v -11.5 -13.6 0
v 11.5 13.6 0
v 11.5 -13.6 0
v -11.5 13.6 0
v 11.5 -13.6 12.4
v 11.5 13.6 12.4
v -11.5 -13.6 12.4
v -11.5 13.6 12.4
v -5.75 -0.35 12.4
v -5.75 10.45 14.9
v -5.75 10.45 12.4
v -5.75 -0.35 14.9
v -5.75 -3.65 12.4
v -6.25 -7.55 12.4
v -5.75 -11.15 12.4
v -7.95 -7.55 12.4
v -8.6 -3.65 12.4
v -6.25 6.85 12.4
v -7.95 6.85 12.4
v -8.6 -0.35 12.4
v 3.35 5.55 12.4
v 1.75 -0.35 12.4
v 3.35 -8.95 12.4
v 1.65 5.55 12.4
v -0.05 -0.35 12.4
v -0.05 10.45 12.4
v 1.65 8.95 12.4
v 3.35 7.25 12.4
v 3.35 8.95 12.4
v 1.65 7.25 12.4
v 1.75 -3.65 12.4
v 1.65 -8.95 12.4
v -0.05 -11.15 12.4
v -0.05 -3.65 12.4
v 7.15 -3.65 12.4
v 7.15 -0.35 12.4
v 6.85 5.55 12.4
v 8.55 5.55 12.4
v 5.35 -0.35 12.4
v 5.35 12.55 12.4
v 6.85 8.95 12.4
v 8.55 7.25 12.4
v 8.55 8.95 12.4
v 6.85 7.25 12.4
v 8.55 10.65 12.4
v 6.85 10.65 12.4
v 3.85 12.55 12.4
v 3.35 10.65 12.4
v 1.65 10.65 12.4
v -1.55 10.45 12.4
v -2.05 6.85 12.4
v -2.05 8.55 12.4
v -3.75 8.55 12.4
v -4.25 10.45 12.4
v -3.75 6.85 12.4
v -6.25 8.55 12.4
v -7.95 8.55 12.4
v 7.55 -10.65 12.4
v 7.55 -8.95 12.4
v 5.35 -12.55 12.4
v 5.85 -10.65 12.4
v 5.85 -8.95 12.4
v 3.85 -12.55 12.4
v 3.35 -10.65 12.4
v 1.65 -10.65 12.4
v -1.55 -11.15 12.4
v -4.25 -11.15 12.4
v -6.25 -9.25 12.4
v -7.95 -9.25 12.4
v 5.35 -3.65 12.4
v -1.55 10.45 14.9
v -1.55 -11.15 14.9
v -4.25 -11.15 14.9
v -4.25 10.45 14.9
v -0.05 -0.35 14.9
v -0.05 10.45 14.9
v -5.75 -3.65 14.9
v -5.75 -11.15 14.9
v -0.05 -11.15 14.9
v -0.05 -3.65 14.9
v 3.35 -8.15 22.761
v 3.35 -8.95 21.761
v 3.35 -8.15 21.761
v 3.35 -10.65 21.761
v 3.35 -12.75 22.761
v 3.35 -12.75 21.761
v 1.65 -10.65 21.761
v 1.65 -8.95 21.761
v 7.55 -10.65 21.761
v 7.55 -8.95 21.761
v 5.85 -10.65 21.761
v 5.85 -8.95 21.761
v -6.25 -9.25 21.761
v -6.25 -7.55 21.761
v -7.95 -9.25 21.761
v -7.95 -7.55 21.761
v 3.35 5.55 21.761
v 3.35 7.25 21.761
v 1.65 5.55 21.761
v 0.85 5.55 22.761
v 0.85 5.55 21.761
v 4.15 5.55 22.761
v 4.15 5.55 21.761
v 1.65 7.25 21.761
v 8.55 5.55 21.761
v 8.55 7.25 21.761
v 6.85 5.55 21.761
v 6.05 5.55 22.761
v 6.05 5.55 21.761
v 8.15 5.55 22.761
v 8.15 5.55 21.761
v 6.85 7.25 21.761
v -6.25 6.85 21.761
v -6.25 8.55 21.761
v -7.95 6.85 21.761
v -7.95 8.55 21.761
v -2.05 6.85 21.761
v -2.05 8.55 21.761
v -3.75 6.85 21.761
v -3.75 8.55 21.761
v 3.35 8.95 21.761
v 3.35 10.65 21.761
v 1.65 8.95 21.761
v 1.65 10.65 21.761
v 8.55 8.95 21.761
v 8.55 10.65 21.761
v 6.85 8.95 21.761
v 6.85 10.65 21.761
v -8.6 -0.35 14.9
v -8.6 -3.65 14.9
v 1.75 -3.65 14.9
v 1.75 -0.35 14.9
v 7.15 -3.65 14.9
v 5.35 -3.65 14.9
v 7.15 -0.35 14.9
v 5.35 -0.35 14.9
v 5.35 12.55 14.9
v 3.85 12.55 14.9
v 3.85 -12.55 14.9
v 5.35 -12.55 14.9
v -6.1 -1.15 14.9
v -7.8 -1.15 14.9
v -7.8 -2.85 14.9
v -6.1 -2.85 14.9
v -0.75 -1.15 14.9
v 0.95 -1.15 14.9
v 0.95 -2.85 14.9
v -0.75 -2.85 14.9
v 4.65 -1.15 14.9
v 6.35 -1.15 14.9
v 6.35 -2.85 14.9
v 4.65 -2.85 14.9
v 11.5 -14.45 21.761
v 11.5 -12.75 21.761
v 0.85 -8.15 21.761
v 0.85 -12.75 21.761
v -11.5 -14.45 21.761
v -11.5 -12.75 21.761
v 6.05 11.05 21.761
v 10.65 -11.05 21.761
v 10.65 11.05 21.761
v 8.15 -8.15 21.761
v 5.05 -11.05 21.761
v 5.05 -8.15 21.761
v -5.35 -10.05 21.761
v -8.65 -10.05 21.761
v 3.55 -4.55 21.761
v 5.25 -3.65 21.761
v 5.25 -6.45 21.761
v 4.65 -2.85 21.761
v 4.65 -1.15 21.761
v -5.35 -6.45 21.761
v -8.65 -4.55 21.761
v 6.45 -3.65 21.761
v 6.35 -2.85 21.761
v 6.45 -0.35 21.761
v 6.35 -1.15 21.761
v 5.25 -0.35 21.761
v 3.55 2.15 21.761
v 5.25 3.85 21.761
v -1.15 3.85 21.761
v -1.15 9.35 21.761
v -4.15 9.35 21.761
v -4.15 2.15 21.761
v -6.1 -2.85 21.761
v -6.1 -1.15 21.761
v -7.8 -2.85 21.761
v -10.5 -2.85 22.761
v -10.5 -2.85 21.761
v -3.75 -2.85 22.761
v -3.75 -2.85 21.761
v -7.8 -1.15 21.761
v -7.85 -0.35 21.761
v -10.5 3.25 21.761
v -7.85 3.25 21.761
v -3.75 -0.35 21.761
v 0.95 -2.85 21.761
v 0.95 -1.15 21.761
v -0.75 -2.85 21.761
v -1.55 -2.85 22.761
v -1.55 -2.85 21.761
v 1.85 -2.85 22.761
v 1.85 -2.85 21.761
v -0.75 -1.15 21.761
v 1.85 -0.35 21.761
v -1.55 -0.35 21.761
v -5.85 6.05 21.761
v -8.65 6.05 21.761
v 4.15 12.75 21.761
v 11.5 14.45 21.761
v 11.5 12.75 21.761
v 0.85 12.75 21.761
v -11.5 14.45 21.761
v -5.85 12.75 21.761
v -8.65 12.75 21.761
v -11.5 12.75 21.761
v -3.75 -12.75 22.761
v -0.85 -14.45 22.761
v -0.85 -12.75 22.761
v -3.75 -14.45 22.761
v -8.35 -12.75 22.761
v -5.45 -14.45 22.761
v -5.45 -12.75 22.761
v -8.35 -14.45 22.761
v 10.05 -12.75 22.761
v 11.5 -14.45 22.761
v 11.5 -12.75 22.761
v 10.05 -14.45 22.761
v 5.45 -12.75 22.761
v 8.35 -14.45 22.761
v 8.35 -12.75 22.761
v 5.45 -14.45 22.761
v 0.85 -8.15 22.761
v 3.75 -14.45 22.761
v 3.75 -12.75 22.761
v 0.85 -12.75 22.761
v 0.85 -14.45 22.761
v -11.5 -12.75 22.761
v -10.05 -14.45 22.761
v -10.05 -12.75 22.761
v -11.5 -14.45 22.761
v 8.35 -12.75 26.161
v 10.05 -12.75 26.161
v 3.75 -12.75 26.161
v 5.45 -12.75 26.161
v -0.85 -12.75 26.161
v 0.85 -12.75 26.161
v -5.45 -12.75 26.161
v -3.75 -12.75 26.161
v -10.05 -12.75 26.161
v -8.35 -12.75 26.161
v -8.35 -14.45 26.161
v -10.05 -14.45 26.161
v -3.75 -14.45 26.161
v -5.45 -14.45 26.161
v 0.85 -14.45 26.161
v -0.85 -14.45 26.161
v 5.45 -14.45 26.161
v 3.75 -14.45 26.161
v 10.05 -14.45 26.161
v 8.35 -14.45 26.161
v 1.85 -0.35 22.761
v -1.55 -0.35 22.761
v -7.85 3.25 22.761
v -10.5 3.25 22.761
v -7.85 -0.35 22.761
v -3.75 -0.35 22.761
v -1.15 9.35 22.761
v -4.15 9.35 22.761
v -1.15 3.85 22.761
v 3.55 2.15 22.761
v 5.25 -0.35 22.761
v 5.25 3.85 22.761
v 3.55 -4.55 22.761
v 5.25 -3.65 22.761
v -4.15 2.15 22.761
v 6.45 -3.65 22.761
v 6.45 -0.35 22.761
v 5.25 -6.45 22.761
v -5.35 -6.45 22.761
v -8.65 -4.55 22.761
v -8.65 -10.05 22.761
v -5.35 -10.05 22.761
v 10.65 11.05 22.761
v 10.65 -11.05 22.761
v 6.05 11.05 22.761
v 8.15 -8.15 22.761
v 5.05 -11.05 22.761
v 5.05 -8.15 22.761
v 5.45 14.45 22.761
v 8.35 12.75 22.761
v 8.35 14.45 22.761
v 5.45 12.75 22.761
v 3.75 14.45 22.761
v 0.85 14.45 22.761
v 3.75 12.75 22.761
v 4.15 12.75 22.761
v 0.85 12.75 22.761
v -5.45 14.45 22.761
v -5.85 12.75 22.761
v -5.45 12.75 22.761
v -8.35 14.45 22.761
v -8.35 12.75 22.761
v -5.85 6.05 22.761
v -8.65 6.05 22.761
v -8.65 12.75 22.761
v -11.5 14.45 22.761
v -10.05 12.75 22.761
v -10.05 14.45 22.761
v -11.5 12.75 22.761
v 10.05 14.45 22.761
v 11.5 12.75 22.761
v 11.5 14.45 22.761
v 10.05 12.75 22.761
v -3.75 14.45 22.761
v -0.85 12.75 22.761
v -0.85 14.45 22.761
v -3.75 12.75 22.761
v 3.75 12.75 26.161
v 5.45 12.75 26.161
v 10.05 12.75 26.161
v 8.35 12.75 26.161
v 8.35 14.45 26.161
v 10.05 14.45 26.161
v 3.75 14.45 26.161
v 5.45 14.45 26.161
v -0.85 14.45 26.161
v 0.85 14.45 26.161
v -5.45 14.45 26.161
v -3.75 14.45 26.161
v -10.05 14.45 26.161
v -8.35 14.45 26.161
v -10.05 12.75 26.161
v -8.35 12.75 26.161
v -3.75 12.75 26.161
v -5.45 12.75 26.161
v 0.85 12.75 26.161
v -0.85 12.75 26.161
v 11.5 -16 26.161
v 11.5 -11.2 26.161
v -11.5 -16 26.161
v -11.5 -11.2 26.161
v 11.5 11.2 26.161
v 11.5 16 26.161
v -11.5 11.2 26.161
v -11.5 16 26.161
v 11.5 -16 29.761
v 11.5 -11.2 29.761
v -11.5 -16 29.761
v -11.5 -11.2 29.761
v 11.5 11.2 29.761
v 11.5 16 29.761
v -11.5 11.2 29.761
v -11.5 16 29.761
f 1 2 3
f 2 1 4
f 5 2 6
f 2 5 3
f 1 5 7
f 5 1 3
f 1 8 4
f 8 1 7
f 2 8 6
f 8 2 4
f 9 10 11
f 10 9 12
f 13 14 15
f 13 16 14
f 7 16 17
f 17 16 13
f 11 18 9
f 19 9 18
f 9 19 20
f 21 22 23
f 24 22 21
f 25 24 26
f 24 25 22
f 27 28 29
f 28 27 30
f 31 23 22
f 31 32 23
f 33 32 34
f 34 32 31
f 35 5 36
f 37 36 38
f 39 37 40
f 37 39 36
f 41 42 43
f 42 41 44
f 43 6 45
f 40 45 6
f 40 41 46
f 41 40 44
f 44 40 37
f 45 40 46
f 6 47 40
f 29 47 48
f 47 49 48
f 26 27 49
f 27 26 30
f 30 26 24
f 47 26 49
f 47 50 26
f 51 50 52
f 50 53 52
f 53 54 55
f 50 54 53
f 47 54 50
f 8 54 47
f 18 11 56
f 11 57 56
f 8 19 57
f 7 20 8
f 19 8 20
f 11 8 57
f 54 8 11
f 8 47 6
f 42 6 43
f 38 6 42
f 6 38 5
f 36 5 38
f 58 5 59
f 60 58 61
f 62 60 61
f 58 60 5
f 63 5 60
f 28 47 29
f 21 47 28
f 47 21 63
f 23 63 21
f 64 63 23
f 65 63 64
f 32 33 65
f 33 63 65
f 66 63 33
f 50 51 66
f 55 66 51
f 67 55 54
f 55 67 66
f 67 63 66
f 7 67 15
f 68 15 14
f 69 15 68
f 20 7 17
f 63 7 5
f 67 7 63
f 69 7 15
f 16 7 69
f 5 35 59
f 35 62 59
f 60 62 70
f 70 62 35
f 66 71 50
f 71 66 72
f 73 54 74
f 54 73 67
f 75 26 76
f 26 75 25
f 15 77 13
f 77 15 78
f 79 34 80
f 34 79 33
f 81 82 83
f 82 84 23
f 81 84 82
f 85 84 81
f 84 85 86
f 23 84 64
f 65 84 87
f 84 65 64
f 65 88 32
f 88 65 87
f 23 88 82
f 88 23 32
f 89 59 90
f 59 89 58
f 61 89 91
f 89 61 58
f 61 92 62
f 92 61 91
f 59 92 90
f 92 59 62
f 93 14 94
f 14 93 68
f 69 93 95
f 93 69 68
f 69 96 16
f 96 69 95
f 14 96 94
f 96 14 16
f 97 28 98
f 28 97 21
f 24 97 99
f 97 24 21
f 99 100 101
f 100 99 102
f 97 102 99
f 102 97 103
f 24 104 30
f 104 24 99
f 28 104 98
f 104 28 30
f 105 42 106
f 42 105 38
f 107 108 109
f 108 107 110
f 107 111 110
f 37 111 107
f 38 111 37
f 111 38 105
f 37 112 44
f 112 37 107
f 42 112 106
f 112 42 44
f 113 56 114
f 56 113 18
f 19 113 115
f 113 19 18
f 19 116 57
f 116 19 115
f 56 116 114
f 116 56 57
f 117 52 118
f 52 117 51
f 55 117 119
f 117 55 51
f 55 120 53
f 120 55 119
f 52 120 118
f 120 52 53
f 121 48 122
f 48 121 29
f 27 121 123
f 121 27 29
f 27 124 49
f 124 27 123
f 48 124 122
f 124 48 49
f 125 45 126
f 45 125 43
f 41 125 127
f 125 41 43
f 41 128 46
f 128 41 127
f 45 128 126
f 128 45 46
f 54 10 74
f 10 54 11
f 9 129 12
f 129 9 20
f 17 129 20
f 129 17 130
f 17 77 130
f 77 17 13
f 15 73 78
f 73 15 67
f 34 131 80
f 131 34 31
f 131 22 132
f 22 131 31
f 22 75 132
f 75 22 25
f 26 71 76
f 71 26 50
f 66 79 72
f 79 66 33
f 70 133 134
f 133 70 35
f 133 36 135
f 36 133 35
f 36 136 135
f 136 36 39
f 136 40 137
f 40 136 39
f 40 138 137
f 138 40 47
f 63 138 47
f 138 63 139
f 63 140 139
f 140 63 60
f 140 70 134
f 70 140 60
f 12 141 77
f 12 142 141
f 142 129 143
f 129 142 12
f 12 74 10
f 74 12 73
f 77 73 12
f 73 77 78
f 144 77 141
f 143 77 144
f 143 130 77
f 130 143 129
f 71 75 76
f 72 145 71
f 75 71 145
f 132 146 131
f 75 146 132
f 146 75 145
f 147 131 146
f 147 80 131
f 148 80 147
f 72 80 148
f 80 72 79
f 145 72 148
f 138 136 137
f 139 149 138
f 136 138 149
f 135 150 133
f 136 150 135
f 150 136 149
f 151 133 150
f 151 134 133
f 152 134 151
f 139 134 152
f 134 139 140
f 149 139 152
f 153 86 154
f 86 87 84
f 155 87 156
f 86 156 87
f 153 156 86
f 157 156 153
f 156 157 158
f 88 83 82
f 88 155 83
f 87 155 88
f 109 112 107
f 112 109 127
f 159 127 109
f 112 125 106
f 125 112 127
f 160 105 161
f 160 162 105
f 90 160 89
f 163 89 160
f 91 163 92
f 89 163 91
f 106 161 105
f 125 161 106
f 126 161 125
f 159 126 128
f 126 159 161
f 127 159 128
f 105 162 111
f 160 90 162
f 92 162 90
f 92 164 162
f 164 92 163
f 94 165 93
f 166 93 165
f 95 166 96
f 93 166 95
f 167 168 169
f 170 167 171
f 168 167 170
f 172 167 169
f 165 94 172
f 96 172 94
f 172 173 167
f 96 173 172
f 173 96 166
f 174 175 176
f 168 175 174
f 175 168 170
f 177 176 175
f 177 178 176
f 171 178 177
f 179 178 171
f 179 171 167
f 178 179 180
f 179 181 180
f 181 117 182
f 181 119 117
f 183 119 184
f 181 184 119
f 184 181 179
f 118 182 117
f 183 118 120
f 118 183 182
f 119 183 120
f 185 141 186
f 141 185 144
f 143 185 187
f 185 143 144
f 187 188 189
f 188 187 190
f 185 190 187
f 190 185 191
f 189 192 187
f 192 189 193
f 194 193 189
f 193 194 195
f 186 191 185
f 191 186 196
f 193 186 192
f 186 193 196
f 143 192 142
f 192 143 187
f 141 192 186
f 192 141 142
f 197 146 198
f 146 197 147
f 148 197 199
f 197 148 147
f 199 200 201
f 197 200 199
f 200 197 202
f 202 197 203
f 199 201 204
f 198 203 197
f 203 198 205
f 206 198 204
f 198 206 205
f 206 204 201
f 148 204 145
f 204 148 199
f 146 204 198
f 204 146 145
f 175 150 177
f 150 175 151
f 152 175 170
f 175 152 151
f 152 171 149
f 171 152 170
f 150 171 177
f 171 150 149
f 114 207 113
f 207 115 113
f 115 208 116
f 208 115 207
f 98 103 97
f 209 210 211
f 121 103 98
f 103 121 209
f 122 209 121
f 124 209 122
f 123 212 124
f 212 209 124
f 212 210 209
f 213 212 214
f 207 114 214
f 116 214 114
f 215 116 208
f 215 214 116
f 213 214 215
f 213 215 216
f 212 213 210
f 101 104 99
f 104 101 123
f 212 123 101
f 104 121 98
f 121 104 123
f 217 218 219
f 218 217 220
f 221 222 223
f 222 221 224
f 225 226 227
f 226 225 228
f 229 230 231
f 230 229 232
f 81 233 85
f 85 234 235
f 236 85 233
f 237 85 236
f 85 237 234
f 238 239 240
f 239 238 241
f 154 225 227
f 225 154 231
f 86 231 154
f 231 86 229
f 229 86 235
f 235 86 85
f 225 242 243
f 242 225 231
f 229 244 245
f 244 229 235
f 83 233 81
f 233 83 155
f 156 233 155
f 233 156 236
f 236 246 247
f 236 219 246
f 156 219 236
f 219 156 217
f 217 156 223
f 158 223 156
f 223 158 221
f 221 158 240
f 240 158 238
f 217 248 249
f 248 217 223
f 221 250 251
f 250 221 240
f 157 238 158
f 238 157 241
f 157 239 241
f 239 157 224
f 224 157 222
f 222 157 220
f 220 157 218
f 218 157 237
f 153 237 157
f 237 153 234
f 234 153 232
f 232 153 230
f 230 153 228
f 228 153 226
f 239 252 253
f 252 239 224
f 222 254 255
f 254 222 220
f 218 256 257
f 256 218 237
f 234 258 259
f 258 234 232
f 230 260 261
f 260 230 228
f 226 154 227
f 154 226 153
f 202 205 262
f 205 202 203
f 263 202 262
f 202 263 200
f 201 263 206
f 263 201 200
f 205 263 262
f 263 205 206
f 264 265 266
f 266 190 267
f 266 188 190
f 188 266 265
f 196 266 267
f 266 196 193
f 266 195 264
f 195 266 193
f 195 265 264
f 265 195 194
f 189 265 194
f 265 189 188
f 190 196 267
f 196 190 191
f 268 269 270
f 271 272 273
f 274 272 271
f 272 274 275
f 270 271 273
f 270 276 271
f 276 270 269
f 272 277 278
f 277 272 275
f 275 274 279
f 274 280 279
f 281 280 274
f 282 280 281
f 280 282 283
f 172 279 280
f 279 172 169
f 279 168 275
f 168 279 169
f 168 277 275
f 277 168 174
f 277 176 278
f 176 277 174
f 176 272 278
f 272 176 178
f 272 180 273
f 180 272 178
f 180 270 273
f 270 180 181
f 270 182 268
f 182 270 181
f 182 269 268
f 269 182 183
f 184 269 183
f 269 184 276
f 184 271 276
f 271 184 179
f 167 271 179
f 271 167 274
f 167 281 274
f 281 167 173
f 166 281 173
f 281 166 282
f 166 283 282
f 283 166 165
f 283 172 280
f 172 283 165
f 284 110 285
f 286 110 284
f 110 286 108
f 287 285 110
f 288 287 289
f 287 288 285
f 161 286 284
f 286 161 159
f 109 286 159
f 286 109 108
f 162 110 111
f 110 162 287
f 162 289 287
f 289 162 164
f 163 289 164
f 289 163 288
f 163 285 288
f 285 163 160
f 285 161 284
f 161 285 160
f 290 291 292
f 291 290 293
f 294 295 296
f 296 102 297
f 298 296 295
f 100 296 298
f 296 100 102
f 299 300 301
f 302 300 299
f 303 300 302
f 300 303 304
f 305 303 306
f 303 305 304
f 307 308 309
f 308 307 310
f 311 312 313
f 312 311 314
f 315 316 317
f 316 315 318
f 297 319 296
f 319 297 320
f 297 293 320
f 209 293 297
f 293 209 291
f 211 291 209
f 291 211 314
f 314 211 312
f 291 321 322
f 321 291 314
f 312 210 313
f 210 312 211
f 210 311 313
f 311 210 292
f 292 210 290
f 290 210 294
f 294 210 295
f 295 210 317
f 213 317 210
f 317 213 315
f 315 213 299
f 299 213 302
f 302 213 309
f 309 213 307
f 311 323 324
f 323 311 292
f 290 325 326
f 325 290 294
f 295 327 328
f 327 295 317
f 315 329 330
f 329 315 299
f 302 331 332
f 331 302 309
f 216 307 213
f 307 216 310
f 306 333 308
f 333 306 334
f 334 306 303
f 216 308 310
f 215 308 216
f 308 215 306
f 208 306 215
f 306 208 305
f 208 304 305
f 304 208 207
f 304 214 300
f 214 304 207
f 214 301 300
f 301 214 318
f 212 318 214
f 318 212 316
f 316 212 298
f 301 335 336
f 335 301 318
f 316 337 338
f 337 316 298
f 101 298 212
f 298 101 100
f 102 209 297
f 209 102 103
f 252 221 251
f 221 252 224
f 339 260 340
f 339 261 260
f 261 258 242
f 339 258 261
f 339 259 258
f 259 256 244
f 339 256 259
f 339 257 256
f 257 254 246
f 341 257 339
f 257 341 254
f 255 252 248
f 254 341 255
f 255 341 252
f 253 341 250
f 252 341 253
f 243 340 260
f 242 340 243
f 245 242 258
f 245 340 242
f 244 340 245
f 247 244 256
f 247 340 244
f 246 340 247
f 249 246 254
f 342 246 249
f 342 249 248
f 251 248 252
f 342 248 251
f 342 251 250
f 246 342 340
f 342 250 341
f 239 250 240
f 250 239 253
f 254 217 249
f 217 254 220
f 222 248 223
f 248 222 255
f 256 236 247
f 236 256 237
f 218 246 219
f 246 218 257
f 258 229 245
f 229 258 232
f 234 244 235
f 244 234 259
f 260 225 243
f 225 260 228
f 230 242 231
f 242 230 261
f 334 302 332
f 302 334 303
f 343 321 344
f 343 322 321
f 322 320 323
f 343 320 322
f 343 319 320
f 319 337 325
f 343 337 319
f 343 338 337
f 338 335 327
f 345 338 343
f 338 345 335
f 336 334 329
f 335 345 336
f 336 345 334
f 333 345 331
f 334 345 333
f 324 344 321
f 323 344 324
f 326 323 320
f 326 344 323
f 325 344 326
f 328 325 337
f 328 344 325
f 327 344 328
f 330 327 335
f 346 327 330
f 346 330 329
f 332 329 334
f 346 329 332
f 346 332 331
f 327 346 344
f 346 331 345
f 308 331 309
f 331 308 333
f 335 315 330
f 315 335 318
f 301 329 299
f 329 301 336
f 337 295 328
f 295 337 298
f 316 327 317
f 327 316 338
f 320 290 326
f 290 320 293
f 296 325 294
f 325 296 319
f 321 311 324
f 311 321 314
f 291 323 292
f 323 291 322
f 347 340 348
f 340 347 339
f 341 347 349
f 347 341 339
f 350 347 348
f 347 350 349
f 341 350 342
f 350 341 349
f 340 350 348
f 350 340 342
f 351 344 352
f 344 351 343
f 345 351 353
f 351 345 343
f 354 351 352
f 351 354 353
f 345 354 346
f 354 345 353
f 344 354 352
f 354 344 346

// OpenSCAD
// Generated by SolidPython 0.4.2 on 2020-09-29 23:21:07
//!OpenSCAD

scale(v = 0.0100000000) {
	translate(v = [-1150, -1360, 0]) {
		union() {
			color(c = [0.4000000000, 0.4000000000, 0.4000000000]) {
				translate(v = [0, 0, 0]) {
					linear_extrude(height = 1000.0000000000) {
						polygon(paths = [[0, 1, 2, 3]], points = [[0, 0], [0, 2720], [2300, 2720], [2300, 0]]);
					}
				}
			}
			color(c = [0.2000000000, 0.6000000000, 0.2000000000]) {
				translate(v = [0, 0, 1000.0000000000]) {
					linear_extrude(height = 120.0000000000) {
						polygon(paths = [[0, 1, 2, 3]], points = [[0, 1305], [0, 2720], [2300, 2720], [2300, 1305]]);
					}
				}
			}
			color(c = [0.4000000000, 0.4000000000, 0.4000000000]) {
				translate(v = [0, 0, 1000.0000000000]) {
					linear_extrude(height = 120.0000000000) {
						polygon(paths = [[0, 1, 2, 3]], points = [[0, 0], [0, 1305], [2300, 1305], [2300, 0]]);
					}
				}
			}
			color(c = [0.9000000000, 0.6000000000, 0.6000000000]) {
				translate(v = [0, 0, 1120.0000000000]) {
					linear_extrude(height = 120.0000000000) {
						polygon(paths = [[0, 1, 2, 3]], points = [[295, 1855], [295, 2275], [575, 2275], [575, 1855]]);
					}
				}
			}
			color(c = [0.9000000000, 0.6000000000, 0.6000000000]) {
				translate(v = [0, 0, 1120.0000000000]) {
					linear_extrude(height = 120.0000000000) {
						polygon(paths = [[0, 1, 2, 3]], points = [[725, 1855], [725, 2275], [995, 2275], [995, 1855]]);
					}
				}
			}
			color(c = [0.9000000000, 0.6000000000, 0.6000000000]) {
				translate(v = [0, 0, 1120.0000000000]) {
					linear_extrude(height = 120.0000000000) {
						polygon(paths = [[0, 1, 2, 3, 4, 5, 6, 7]], points = [[1225, 1485], [1225, 1855], [1145, 1855], [1145, 2275], [1275, 2275], [1275, 2485], [1535, 2485], [1535, 1485]]);
					}
				}
			}
			color(c = [0.9000000000, 0.6000000000, 0.6000000000]) {
				translate(v = [0, 0, 1120.0000000000]) {
					linear_extrude(height = 120.0000000000) {
						polygon(paths = [[0, 1, 2, 3]], points = [[1685, 1485], [1685, 2485], [2160, 2485], [2160, 1485]]);
					}
				}
			}
			color(c = [0.9000000000, 0.6000000000, 0.9000000000]) {
				translate(v = [0, 0, 1120.0000000000]) {
					linear_extrude(height = 120.0000000000) {
						polygon(paths = [[0, 1, 2, 3]], points = [[295, 375], [295, 795], [575, 795], [575, 375]]);
					}
				}
			}
			color(c = [0.9000000000, 0.6000000000, 0.9000000000]) {
				translate(v = [0, 0, 1120.0000000000]) {
					linear_extrude(height = 120.0000000000) {
						polygon(paths = [[0, 1, 2, 3]], points = [[725, 375], [725, 795], [995, 795], [995, 375]]);
					}
				}
			}
			color(c = [0.9000000000, 0.6000000000, 0.9000000000]) {
				translate(v = [0, 0, 1120.0000000000]) {
					linear_extrude(height = 120.0000000000) {
						polygon(paths = [[0, 1, 2, 3, 4, 5, 6, 7]], points = [[1275, 235], [1275, 375], [1145, 375], [1145, 795], [1275, 795], [1275, 885], [1535, 885], [1535, 235]]);
					}
				}
			}
			color(c = [0.9000000000, 0.6000000000, 0.9000000000]) {
				translate(v = [0, 0, 1120.0000000000]) {
					linear_extrude(height = 120.0000000000) {
						polygon(paths = [[0, 1, 2, 3]], points = [[1685, 235], [1685, 885], [1965, 885], [1965, 235]]);
					}
				}
			}
			color(c = [0.2000000000, 0.6000000000, 0.2000000000]) {
				translate(v = [0, 0, 1120.0000000000]) {
					linear_extrude(height = 120.0000000000) {
						difference() {
							polygon(paths = [[0, 1, 2, 3]], points = [[0, 1305], [0, 2720], [2300, 2720], [2300, 1305]]);
							polygon(paths = [[0, 1, 2, 3]], points = [[1685, 1485], [2160, 1485], [2160, 2485], [1685, 2485]]);
							polygon(paths = [[0, 1, 2, 3]], points = [[295, 1855], [575, 1855], [575, 2275], [295, 2275]]);
							polygon(paths = [[0, 1, 2, 3]], points = [[725, 1855], [995, 1855], [995, 2275], [725, 2275]]);
							polygon(paths = [[0, 1, 2, 3, 4, 5, 6, 7]], points = [[1225, 1485], [1535, 1485], [1535, 2485], [1275, 2485], [1275, 2275], [1145, 2275], [1145, 1855], [1225, 1855]]);
						}
					}
				}
			}
			color(c = [0.4000000000, 0.4000000000, 0.4000000000]) {
				translate(v = [0, 0, 1120.0000000000]) {
					linear_extrude(height = 120.0000000000) {
						difference() {
							polygon(paths = [[0, 1, 2, 3]], points = [[0, 0], [0, 1305], [2300, 1305], [2300, 0]]);
							polygon(paths = [[0, 1, 2, 3]], points = [[1685, 235], [1965, 235], [1965, 885], [1685, 885]]);
							polygon(paths = [[0, 1, 2, 3]], points = [[295, 375], [575, 375], [575, 795], [295, 795]]);
							polygon(paths = [[0, 1, 2, 3]], points = [[725, 375], [995, 375], [995, 795], [725, 795]]);
							polygon(paths = [[0, 1, 2, 3, 4, 5, 6, 7]], points = [[1275, 235], [1535, 235], [1535, 885], [1275, 885], [1275, 795], [1145, 795], [1145, 375], [1275, 375]]);
						}
					}
				}
			}
			color(c = [0.1000000000, 0.1000000000, 0.1000000000]) {
				translate(v = [0, 0, 1240.0000000000]) {
					linear_extrude(height = 70.0000000000) {
						polygon(paths = [[0, 1, 2, 3]], points = [[1315, 295], [1315, 465], [1485, 465], [1485, 295]]);
					}
				}
			}
			color(c = [0.1000000000, 0.1000000000, 0.1000000000]) {
				translate(v = [0, 0, 1240.0000000000]) {
					linear_extrude(height = 70.0000000000) {
						polygon(paths = [[0, 1, 2, 3]], points = [[1735, 295], [1735, 465], [1905, 465], [1905, 295]]);
					}
				}
			}
			color(c = [0.1000000000, 0.1000000000, 0.1000000000]) {
				translate(v = [0, 0, 1240.0000000000]) {
					linear_extrude(height = 70.0000000000) {
						polygon(paths = [[0, 1, 2, 3]], points = [[355, 435], [355, 605], [525, 605], [525, 435]]);
					}
				}
			}
			color(c = [0.1000000000, 0.1000000000, 0.1000000000]) {
				translate(v = [0, 0, 1240.0000000000]) {
					linear_extrude(height = 70.0000000000) {
						polygon(paths = [[0, 1, 2, 3]], points = [[1315, 1915], [1315, 2085], [1485, 2085], [1485, 1915]]);
					}
				}
			}
			color(c = [0.1000000000, 0.1000000000, 0.1000000000]) {
				translate(v = [0, 0, 1240.0000000000]) {
					linear_extrude(height = 70.0000000000) {
						polygon(paths = [[0, 1, 2, 3]], points = [[1835, 1915], [1835, 2085], [2005, 2085], [2005, 1915]]);
					}
				}
			}
			color(c = [0.1000000000, 0.1000000000, 0.1000000000]) {
				translate(v = [0, 0, 1240.0000000000]) {
					linear_extrude(height = 70.0000000000) {
						polygon(paths = [[0, 1, 2, 3]], points = [[355, 2045], [355, 2215], [525, 2215], [525, 2045]]);
					}
				}
			}
			color(c = [0.1000000000, 0.1000000000, 0.1000000000]) {
				translate(v = [0, 0, 1240.0000000000]) {
					linear_extrude(height = 70.0000000000) {
						polygon(paths = [[0, 1, 2, 3]], points = [[775, 2045], [775, 2215], [945, 2215], [945, 2045]]);
					}
				}
			}
			color(c = [0.1000000000, 0.1000000000, 0.1000000000]) {
				translate(v = [0, 0, 1240.0000000000]) {
					linear_extrude(height = 70.0000000000) {
						polygon(paths = [[0, 1, 2, 3]], points = [[1315, 2255], [1315, 2425], [1485, 2425], [1485, 2255]]);
					}
				}
			}
			color(c = [0.1000000000, 0.1000000000, 0.1000000000]) {
				translate(v = [0, 0, 1240.0000000000]) {
					linear_extrude(height = 70.0000000000) {
						polygon(paths = [[0, 1, 2, 3]], points = [[1835, 2255], [1835, 2425], [2005, 2425], [2005, 2255]]);
					}
				}
			}
			color(c = [1.0000000000, 1.0000000000, 1.0000000000]) {
				translate(v = [0, 0, 1240.0000000000]) {
					linear_extrude(height = 70.0000000000) {
						polygon(paths = [[0, 1, 2, 3, 4, 5, 6, 7]], points = [[575, 245], [575, 995], [290, 995], [290, 1325], [575, 1325], [575, 2405], [725, 2405], [725, 245]]);
					}
				}
			}
			color(c = [1.0000000000, 1.0000000000, 1.0000000000]) {
				translate(v = [0, 0, 1240.0000000000]) {
					linear_extrude(height = 70.0000000000) {
						polygon(paths = [[0, 1, 2, 3, 4, 5, 6, 7]], points = [[995, 245], [995, 2405], [1145, 2405], [1145, 1325], [1325, 1325], [1325, 995], [1145, 995], [1145, 245]]);
					}
				}
			}
			color(c = [1.0000000000, 1.0000000000, 1.0000000000]) {
				translate(v = [0, 0, 1240.0000000000]) {
					linear_extrude(height = 70.0000000000) {
						polygon(paths = [[0, 1, 2, 3, 4, 5, 6, 7]], points = [[1535, 105], [1535, 2615], [1685, 2615], [1685, 1325], [1865, 1325], [1865, 995], [1685, 995], [1685, 105]]);
					}
				}
			}
			color(c = [0.1000000000, 0.1000000000, 0.1000000000]) {
				translate(v = [0, 0, 1310.0000000000]) {
					linear_extrude(height = 180.0000000000) {
						polygon(paths = [[0, 1, 2, 3]], points = [[1315, 295], [1315, 465], [1485, 465], [1485, 295]]);
					}
				}
			}
			color(c = [0.1000000000, 0.1000000000, 0.1000000000]) {
				translate(v = [0, 0, 1310.0000000000]) {
					linear_extrude(height = 180.0000000000) {
						polygon(paths = [[0, 1, 2, 3]], points = [[1735, 295], [1735, 465], [1905, 465], [1905, 295]]);
					}
				}
			}
			color(c = [0.1000000000, 0.1000000000, 0.1000000000]) {
				translate(v = [0, 0, 1310.0000000000]) {
					linear_extrude(height = 180.0000000000) {
						polygon(paths = [[0, 1, 2, 3]], points = [[355, 435], [355, 605], [525, 605], [525, 435]]);
					}
				}
			}
			color(c = [0.1000000000, 0.1000000000, 0.1000000000]) {
				translate(v = [0, 0, 1310.0000000000]) {
					linear_extrude(height = 180.0000000000) {
						polygon(paths = [[0, 1, 2, 3]], points = [[1315, 1915], [1315, 2085], [1485, 2085], [1485, 1915]]);
					}
				}
			}
			color(c = [0.1000000000, 0.1000000000, 0.1000000000]) {
				translate(v = [0, 0, 1310.0000000000]) {
					linear_extrude(height = 180.0000000000) {
						polygon(paths = [[0, 1, 2, 3]], points = [[1835, 1915], [1835, 2085], [2005, 2085], [2005, 1915]]);
					}
				}
			}
			color(c = [0.1000000000, 0.1000000000, 0.1000000000]) {
				translate(v = [0, 0, 1310.0000000000]) {
					linear_extrude(height = 180.0000000000) {
						polygon(paths = [[0, 1, 2, 3]], points = [[355, 2045], [355, 2215], [525, 2215], [525, 2045]]);
					}
				}
			}
			color(c = [0.1000000000, 0.1000000000, 0.1000000000]) {
				translate(v = [0, 0, 1310.0000000000]) {
					linear_extrude(height = 180.0000000000) {
						polygon(paths = [[0, 1, 2, 3]], points = [[775, 2045], [775, 2215], [945, 2215], [945, 2045]]);
					}
				}
			}
			color(c = [0.1000000000, 0.1000000000, 0.1000000000]) {
				translate(v = [0, 0, 1310.0000000000]) {
					linear_extrude(height = 180.0000000000) {
						polygon(paths = [[0, 1, 2, 3]], points = [[1315, 2255], [1315, 2425], [1485, 2425], [1485, 2255]]);
					}
				}
			}
			color(c = [0.1000000000, 0.1000000000, 0.1000000000]) {
				translate(v = [0, 0, 1310.0000000000]) {
					linear_extrude(height = 180.0000000000) {
						polygon(paths = [[0, 1, 2, 3]], points = [[1835, 2255], [1835, 2425], [2005, 2425], [2005, 2255]]);
					}
				}
			}
			color(c = [0.7000000000, 0, 0]) {
				translate(v = [0, 0, 1310.0000000000]) {
					linear_extrude(height = 180.0000000000) {
						polygon(paths = [[0, 1, 2, 3, 4, 5, 6, 7]], points = [[575, 245], [575, 995], [290, 995], [290, 1325], [575, 1325], [575, 2405], [725, 2405], [725, 245]]);
					}
				}
			}
			color(c = [0.7000000000, 0, 0]) {
				translate(v = [0, 0, 1310.0000000000]) {
					linear_extrude(height = 180.0000000000) {
						polygon(paths = [[0, 1, 2, 3, 4, 5, 6, 7]], points = [[995, 245], [995, 2405], [1145, 2405], [1145, 1325], [1325, 1325], [1325, 995], [1145, 995], [1145, 245]]);
					}
				}
			}
			color(c = [0.7000000000, 0, 0]) {
				translate(v = [0, 0, 1310.0000000000]) {
					linear_extrude(height = 180.0000000000) {
						polygon(paths = [[0, 1, 2, 3, 4, 5, 6, 7]], points = [[1535, 105], [1535, 2615], [1685, 2615], [1685, 1325], [1865, 1325], [1865, 995], [1685, 995], [1685, 105]]);
					}
				}
			}
			color(c = [0.1000000000, 0.1000000000, 0.1000000000]) {
				translate(v = [0, 0, 1490.0000000000]) {
					linear_extrude(height = 686.1000000000) {
						polygon(paths = [[0, 1, 2, 3]], points = [[1315, 295], [1315, 465], [1485, 465], [1485, 295]]);
					}
				}
			}
			color(c = [0.1000000000, 0.1000000000, 0.1000000000]) {
				translate(v = [0, 0, 1490.0000000000]) {
					linear_extrude(height = 686.1000000000) {
						polygon(paths = [[0, 1, 2, 3]], points = [[1735, 295], [1735, 465], [1905, 465], [1905, 295]]);
					}
				}
			}
			color(c = [0.1000000000, 0.1000000000, 0.1000000000]) {
				translate(v = [0, 0, 1490.0000000000]) {
					linear_extrude(height = 686.1000000000) {
						polygon(paths = [[0, 1, 2, 3]], points = [[355, 435], [355, 605], [525, 605], [525, 435]]);
					}
				}
			}
			color(c = [0.1000000000, 0.1000000000, 0.1000000000]) {
				translate(v = [0, 0, 1490.0000000000]) {
					linear_extrude(height = 686.1000000000) {
						polygon(paths = [[0, 1, 2, 3]], points = [[370, 1075], [370, 1245], [540, 1245], [540, 1075]]);
					}
				}
			}
			color(c = [0.1000000000, 0.1000000000, 0.1000000000]) {
				translate(v = [0, 0, 1490.0000000000]) {
					linear_extrude(height = 686.1000000000) {
						polygon(paths = [[0, 1, 2, 3]], points = [[1075, 1075], [1075, 1245], [1245, 1245], [1245, 1075]]);
					}
				}
			}
			color(c = [0.1000000000, 0.1000000000, 0.1000000000]) {
				translate(v = [0, 0, 1490.0000000000]) {
					linear_extrude(height = 686.1000000000) {
						polygon(paths = [[0, 1, 2, 3]], points = [[1615, 1075], [1615, 1245], [1785, 1245], [1785, 1075]]);
					}
				}
			}
			color(c = [0.1000000000, 0.1000000000, 0.1000000000]) {
				translate(v = [0, 0, 1490.0000000000]) {
					linear_extrude(height = 686.1000000000) {
						polygon(paths = [[0, 1, 2, 3]], points = [[1315, 1915], [1315, 2085], [1485, 2085], [1485, 1915]]);
					}
				}
			}
			color(c = [0.1000000000, 0.1000000000, 0.1000000000]) {
				translate(v = [0, 0, 1490.0000000000]) {
					linear_extrude(height = 686.1000000000) {
						polygon(paths = [[0, 1, 2, 3]], points = [[1835, 1915], [1835, 2085], [2005, 2085], [2005, 1915]]);
					}
				}
			}
			color(c = [0.1000000000, 0.1000000000, 0.1000000000]) {
				translate(v = [0, 0, 1490.0000000000]) {
					linear_extrude(height = 686.1000000000) {
						polygon(paths = [[0, 1, 2, 3]], points = [[355, 2045], [355, 2215], [525, 2215], [525, 2045]]);
					}
				}
			}
			color(c = [0.1000000000, 0.1000000000, 0.1000000000]) {
				translate(v = [0, 0, 1490.0000000000]) {
					linear_extrude(height = 686.1000000000) {
						polygon(paths = [[0, 1, 2, 3]], points = [[775, 2045], [775, 2215], [945, 2215], [945, 2045]]);
					}
				}
			}
			color(c = [0.1000000000, 0.1000000000, 0.1000000000]) {
				translate(v = [0, 0, 1490.0000000000]) {
					linear_extrude(height = 686.1000000000) {
						polygon(paths = [[0, 1, 2, 3]], points = [[1315, 2255], [1315, 2425], [1485, 2425], [1485, 2255]]);
					}
				}
			}
			color(c = [0.1000000000, 0.1000000000, 0.1000000000]) {
				translate(v = [0, 0, 1490.0000000000]) {
					linear_extrude(height = 686.1000000000) {
						polygon(paths = [[0, 1, 2, 3]], points = [[1835, 2255], [1835, 2425], [2005, 2425], [2005, 2255]]);
					}
				}
			}
			color(c = [0.9000000000, 0.6000000000, 0.6000000000]) {
				translate(v = [0, 0, 2176.1000000000]) {
					linear_extrude(height = 100.0000000000) {
						polygon(paths = [[0, 1, 2, 3, 4, 5, 6, 7]], points = [[0, -85], [0, 85], [1235, 85], [1235, 545], [1485, 545], [1485, 85], [2300, 85], [2300, -85]]);
					}
				}
			}
			color(c = [0.9000000000, 0.6000000000, 0.6000000000]) {
				translate(v = [0, 0, 2176.1000000000]) {
					linear_extrude(height = 100.0000000000) {
						polygon(paths = [[0, 1, 2, 3]], points = [[995, 1075], [995, 1325], [1335, 1325], [1335, 1075]]);
					}
				}
			}
			color(c = [0.9000000000, 0.6000000000, 0.6000000000]) {
				translate(v = [0, 0, 2176.1000000000]) {
					linear_extrude(height = 100.0000000000) {
						polygon(paths = [[0, 1, 2, 3, 4, 5]], points = [[100, 1075], [100, 1685], [365, 1685], [365, 1325], [775, 1325], [775, 1075]]);
					}
				}
			}
			color(c = [0.9000000000, 0.6000000000, 0.6000000000]) {
				translate(v = [0, 0, 2176.1000000000]) {
					linear_extrude(height = 100.0000000000) {
						polygon(paths = [[0, 1, 2, 3, 4, 5, 6, 7, 8, 9, 10, 11, 12, 13, 14, 15]], points = [[285, 355], [285, 905], [1505, 905], [1505, 1575], [735, 1575], [735, 2295], [1035, 2295], [1035, 1745], [1675, 1745], [1675, 1325], [1795, 1325], [1795, 995], [1675, 995], [1675, 715], [615, 715], [615, 355]]);
					}
				}
			}
			color(c = [0.9000000000, 0.6000000000, 0.6000000000]) {
				translate(v = [0, 0, 2176.1000000000]) {
					linear_extrude(height = 100.0000000000) {
						polygon(paths = [[0, 1, 2, 3, 4, 5, 6, 7]], points = [[1655, 255], [1655, 545], [1965, 545], [1965, 1915], [1755, 1915], [1755, 2465], [2215, 2465], [2215, 255]]);
					}
				}
			}
			color(c = [0.9000000000, 0.6000000000, 0.6000000000]) {
				translate(v = [0, 0, 2176.1000000000]) {
					linear_extrude(height = 100.0000000000) {
						polygon(paths = [[0, 1, 2, 3, 4, 5, 6, 7, 8, 9, 10, 11]], points = [[1235, 1915], [1235, 2635], [565, 2635], [565, 1965], [285, 1965], [285, 2635], [0, 2635], [0, 2805], [2300, 2805], [2300, 2635], [1565, 2635], [1565, 1915]]);
					}
				}
			}
			color(c = [0.5000000000, 0.5000000000, 0.5000000000]) {
				translate(v = [0, 0, 2276.1000000000]) {
					linear_extrude(height = 340.0000000000) {
						polygon(paths = [[0, 1, 2, 3]], points = [[145, -85], [145, 85], [315, 85], [315, -85]]);
					}
				}
			}
			color(c = [0.5000000000, 0.5000000000, 0.5000000000]) {
				translate(v = [0, 0, 2276.1000000000]) {
					linear_extrude(height = 340.0000000000) {
						polygon(paths = [[0, 1, 2, 3]], points = [[605, -85], [605, 85], [775, 85], [775, -85]]);
					}
				}
			}
			color(c = [0.5000000000, 0.5000000000, 0.5000000000]) {
				translate(v = [0, 0, 2276.1000000000]) {
					linear_extrude(height = 340.0000000000) {
						polygon(paths = [[0, 1, 2, 3]], points = [[1065, -85], [1065, 85], [1235, 85], [1235, -85]]);
					}
				}
			}
			color(c = [0.5000000000, 0.5000000000, 0.5000000000]) {
				translate(v = [0, 0, 2276.1000000000]) {
					linear_extrude(height = 340.0000000000) {
						polygon(paths = [[0, 1, 2, 3]], points = [[1525, -85], [1525, 85], [1695, 85], [1695, -85]]);
					}
				}
			}
			color(c = [0.5000000000, 0.5000000000, 0.5000000000]) {
				translate(v = [0, 0, 2276.1000000000]) {
					linear_extrude(height = 340.0000000000) {
						polygon(paths = [[0, 1, 2, 3]], points = [[1985, -85], [1985, 85], [2155, 85], [2155, -85]]);
					}
				}
			}
			color(c = [0.5000000000, 0.5000000000, 0.5000000000]) {
				translate(v = [0, 0, 2276.1000000000]) {
					linear_extrude(height = 340.0000000000) {
						polygon(paths = [[0, 1, 2, 3]], points = [[145, 2635], [145, 2805], [315, 2805], [315, 2635]]);
					}
				}
			}
			color(c = [0.5000000000, 0.5000000000, 0.5000000000]) {
				translate(v = [0, 0, 2276.1000000000]) {
					linear_extrude(height = 340.0000000000) {
						polygon(paths = [[0, 1, 2, 3]], points = [[605, 2635], [605, 2805], [775, 2805], [775, 2635]]);
					}
				}
			}
			color(c = [0.5000000000, 0.5000000000, 0.5000000000]) {
				translate(v = [0, 0, 2276.1000000000]) {
					linear_extrude(height = 340.0000000000) {
						polygon(paths = [[0, 1, 2, 3]], points = [[1065, 2635], [1065, 2805], [1235, 2805], [1235, 2635]]);
					}
				}
			}
			color(c = [0.5000000000, 0.5000000000, 0.5000000000]) {
				translate(v = [0, 0, 2276.1000000000]) {
					linear_extrude(height = 340.0000000000) {
						polygon(paths = [[0, 1, 2, 3]], points = [[1525, 2635], [1525, 2805], [1695, 2805], [1695, 2635]]);
					}
				}
			}
			color(c = [0.5000000000, 0.5000000000, 0.5000000000]) {
				translate(v = [0, 0, 2276.1000000000]) {
					linear_extrude(height = 340.0000000000) {
						polygon(paths = [[0, 1, 2, 3]], points = [[1985, 2635], [1985, 2805], [2155, 2805], [2155, 2635]]);
					}
				}
			}
			color(c = [0.3000000000, 0.3000000000, 1]) {
				translate(v = [0, 0, 2616.1000000000]) {
					linear_extrude(height = 360.0000000000) {
						polygon(paths = [[0, 1, 2, 3]], points = [[0, -240], [0, 240], [2300, 240], [2300, -240]]);
					}
				}
			}
			color(c = [0.3000000000, 0.3000000000, 1]) {
				translate(v = [0, 0, 2616.1000000000]) {
					linear_extrude(height = 360.0000000000) {
						polygon(paths = [[0, 1, 2, 3]], points = [[0, 2480], [0, 2960], [2300, 2960], [2300, 2480]]);
					}
				}
			}
		}
	}
}
